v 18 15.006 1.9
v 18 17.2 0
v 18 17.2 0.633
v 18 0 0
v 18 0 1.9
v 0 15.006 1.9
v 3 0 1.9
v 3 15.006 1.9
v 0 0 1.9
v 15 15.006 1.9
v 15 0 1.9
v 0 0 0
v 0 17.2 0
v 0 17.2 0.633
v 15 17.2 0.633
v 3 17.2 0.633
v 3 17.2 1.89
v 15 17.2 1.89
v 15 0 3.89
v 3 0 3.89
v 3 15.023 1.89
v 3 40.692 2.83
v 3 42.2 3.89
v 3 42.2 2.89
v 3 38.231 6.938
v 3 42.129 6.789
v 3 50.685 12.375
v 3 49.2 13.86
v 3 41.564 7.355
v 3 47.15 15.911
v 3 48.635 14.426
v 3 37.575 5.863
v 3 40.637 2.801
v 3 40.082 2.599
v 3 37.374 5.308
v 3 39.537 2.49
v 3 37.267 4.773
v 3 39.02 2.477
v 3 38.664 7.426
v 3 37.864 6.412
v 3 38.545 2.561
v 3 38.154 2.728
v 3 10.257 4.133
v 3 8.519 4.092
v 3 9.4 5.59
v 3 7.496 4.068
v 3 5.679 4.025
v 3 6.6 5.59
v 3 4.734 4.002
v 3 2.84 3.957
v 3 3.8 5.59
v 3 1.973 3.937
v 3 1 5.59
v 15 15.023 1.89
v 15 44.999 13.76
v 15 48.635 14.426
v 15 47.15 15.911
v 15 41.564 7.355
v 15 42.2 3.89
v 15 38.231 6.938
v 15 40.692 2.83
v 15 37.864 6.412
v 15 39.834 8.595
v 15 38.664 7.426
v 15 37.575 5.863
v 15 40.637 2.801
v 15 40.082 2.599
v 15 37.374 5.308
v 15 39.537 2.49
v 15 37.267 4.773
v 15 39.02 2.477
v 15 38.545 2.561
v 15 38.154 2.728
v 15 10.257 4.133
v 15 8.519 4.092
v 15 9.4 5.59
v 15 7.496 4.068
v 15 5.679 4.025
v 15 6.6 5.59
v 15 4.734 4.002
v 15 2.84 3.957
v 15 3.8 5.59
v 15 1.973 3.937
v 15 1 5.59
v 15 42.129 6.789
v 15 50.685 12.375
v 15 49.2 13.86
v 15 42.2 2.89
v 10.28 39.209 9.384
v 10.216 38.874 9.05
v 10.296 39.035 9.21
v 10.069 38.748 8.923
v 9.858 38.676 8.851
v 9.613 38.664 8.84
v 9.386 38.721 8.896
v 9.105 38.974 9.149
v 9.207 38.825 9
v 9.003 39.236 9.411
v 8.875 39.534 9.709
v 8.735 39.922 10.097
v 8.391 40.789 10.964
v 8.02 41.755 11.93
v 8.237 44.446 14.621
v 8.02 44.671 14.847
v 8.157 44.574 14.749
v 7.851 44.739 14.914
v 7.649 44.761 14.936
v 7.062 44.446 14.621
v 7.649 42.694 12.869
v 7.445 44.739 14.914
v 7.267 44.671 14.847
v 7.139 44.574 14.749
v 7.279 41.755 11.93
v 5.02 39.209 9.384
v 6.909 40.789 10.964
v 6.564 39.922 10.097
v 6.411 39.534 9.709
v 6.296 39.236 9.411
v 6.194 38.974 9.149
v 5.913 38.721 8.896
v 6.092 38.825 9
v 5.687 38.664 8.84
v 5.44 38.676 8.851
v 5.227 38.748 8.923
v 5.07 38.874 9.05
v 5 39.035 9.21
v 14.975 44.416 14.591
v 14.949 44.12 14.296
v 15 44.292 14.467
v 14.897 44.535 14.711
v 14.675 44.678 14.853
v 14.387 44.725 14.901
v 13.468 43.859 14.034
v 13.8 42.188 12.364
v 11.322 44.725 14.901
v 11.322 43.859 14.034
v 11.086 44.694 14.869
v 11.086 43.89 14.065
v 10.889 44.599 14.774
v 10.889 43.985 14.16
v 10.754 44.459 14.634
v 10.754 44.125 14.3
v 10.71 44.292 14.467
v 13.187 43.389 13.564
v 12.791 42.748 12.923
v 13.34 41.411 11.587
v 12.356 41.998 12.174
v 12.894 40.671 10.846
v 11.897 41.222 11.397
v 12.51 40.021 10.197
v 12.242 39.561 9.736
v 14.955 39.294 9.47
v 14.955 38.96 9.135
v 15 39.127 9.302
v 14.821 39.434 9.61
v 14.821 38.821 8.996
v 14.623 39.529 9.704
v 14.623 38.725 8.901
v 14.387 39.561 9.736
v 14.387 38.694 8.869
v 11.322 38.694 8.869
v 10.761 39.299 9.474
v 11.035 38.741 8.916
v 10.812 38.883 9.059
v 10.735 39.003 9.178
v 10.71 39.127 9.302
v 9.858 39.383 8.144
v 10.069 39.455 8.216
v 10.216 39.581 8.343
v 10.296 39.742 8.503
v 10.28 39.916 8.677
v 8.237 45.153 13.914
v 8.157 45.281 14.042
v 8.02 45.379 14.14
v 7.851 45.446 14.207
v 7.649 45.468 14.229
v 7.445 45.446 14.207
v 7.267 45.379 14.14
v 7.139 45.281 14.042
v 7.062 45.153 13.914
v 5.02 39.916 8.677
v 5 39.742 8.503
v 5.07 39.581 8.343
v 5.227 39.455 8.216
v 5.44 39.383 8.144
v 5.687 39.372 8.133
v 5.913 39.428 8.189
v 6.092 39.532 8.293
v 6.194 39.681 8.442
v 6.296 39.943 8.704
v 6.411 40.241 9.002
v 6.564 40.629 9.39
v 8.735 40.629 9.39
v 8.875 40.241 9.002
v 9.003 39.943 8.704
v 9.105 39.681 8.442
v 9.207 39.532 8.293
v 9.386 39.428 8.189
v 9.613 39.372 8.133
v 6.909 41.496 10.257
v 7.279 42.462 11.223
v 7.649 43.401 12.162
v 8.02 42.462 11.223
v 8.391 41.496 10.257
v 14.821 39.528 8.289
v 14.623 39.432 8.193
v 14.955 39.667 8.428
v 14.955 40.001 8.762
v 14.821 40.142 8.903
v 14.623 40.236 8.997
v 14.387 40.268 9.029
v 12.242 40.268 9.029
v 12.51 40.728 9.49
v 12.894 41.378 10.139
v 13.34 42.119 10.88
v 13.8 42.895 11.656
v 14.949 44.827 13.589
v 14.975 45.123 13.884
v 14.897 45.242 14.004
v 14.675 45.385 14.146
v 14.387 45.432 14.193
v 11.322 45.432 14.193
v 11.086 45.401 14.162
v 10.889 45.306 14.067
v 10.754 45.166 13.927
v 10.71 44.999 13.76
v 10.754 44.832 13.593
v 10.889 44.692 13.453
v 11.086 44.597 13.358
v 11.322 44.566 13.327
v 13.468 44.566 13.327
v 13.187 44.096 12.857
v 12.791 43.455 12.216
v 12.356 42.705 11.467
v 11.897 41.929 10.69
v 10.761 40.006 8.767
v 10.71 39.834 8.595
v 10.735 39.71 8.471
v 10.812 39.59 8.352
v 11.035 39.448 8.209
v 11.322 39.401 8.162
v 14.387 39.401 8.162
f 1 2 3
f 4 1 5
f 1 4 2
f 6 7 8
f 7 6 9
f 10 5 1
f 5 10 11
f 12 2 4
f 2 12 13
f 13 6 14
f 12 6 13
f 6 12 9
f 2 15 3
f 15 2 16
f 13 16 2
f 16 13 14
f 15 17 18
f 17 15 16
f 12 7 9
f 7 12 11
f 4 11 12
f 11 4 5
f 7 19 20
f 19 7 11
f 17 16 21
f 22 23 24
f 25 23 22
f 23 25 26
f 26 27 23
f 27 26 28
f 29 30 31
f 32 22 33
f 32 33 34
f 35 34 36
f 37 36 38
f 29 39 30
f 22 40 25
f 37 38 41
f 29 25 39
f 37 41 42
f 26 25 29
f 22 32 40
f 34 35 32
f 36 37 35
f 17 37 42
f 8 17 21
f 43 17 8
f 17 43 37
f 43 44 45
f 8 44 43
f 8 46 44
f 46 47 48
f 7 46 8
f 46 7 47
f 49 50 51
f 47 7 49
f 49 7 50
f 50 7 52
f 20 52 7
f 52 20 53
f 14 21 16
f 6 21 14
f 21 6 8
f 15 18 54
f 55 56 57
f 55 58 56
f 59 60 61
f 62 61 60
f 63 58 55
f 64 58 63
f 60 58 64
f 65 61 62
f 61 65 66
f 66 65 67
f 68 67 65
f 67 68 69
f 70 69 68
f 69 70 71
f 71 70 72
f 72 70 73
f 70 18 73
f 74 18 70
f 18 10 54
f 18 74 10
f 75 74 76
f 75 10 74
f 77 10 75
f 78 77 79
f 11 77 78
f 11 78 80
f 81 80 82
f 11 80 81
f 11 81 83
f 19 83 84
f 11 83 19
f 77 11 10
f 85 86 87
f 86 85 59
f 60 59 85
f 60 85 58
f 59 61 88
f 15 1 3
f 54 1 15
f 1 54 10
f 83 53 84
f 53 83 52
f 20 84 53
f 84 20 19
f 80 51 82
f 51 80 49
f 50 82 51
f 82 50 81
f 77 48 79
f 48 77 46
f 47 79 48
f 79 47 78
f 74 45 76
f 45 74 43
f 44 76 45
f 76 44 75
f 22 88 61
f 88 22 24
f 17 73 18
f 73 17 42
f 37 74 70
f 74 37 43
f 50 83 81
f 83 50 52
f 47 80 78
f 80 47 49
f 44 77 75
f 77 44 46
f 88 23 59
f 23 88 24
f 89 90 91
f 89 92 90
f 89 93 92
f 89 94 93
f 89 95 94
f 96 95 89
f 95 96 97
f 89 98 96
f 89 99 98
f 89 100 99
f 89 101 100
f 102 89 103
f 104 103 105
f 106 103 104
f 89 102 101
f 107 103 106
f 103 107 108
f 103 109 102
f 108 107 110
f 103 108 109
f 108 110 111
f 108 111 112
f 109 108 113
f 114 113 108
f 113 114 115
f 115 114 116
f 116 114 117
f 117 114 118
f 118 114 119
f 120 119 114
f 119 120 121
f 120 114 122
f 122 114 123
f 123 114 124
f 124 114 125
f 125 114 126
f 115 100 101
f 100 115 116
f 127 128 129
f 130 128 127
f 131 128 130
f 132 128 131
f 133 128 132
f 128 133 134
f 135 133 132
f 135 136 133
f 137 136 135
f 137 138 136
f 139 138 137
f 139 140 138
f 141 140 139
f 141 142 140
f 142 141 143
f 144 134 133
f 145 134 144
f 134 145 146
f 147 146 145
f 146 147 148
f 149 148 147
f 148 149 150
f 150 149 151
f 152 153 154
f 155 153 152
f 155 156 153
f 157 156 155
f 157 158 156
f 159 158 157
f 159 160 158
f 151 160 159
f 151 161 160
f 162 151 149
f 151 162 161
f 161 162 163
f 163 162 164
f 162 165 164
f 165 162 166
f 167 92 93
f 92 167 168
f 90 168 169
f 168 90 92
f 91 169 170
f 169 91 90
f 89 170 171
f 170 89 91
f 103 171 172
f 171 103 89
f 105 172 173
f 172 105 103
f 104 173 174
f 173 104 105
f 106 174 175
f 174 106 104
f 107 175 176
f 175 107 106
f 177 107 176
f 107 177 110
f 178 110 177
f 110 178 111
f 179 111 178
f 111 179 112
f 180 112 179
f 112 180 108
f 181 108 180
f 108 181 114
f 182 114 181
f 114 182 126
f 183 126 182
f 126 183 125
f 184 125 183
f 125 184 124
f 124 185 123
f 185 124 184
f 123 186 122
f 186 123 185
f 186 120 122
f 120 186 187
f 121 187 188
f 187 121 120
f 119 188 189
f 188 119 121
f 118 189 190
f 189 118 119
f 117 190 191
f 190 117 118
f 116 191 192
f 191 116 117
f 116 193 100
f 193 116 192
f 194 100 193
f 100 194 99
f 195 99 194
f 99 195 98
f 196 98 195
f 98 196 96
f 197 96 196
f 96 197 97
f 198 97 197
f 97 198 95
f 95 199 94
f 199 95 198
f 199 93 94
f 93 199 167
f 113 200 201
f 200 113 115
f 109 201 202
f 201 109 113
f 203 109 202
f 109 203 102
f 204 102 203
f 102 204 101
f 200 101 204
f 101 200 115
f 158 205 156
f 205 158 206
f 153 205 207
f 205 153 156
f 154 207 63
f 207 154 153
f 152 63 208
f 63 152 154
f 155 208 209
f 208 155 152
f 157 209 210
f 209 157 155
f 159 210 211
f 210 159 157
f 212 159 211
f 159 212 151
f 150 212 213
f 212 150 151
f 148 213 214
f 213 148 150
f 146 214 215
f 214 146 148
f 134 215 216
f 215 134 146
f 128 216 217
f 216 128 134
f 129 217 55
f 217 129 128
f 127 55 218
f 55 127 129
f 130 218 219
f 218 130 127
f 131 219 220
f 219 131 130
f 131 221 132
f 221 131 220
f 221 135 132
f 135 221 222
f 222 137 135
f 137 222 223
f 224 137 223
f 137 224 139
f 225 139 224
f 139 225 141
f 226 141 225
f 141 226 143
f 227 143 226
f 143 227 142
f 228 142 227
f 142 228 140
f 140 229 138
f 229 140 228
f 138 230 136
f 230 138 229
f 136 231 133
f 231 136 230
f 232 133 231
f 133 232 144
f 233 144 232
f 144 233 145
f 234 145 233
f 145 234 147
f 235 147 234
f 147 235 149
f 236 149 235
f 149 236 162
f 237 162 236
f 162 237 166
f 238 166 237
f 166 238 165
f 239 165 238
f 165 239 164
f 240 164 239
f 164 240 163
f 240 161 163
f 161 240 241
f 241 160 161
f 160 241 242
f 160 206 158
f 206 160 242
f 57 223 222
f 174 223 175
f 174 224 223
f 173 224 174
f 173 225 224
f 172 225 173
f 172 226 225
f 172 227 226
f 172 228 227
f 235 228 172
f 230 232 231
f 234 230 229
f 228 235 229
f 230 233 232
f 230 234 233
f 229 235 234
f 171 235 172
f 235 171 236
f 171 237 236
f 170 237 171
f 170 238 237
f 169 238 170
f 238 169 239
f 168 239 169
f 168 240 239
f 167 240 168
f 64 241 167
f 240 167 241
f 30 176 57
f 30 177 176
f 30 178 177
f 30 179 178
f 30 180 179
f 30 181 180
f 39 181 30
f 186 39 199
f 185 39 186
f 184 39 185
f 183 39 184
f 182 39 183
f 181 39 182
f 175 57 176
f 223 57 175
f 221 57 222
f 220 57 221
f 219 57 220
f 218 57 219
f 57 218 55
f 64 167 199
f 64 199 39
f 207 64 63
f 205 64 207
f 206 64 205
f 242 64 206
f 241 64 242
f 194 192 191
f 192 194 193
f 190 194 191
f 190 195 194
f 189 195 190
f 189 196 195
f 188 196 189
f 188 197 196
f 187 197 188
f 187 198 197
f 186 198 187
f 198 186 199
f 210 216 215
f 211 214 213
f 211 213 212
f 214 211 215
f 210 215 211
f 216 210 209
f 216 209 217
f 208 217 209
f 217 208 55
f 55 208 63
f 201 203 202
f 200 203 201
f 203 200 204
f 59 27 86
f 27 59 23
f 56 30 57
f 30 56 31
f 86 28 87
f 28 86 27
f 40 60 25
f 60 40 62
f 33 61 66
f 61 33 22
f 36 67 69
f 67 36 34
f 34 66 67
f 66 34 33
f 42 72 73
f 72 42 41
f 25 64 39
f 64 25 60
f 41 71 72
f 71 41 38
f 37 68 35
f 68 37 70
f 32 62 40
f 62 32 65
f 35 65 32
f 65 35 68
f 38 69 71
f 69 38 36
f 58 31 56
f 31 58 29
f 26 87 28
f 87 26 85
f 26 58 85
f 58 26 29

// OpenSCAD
// file: hotshoe_paper_clip.scad
hs_w      = 18.0;
hs_l      = 17.2;
hs_h      = 1.9; // 2
hs2_w     = 12;
//hs2_l     = hs_l+5;
hs2_h     = 2;
hs2_x_off = (hs_w-hs2_w)/2;
hs2_elev  = 1;
hs3_l     = 12;
hs3_h     = 5;
hs3_w     = 0.8;

module hotshoe(
    logofile="", logooffset=1,
    len=5
    ) {
    hs2_l = hs_l+len;
    union() {
        // lower hotshoe
        difference() {
            cube([hs_w, hs_l, hs_h]);
            translate([-1,hs_l,hs_h/3]) rotate([60,0,0]) cube([hs2_x_off+1, 10,10]);
            translate([hs2_x_off+hs2_w,hs_l,hs_h/3]) rotate([60,0,0]) cube([hs2_x_off+1, 10,10]);
        }
        // upper plate including grip
        translate([hs2_x_off, 0, hs_h-0.01]) {
            rotate([90,0,90])
            linear_extrude(height=hs2_w) {
                polygon(
                points=[[0,0], [hs2_l,0], [hs_l,0], [hs2_l,hs2_elev],[hs2_l,hs2_elev+hs2_h],
                //[hs_l,hs2_h],
                [0,hs2_h]],
                paths=[[0,1,2,3,4,5,6]]
                );
            }
            for ( i = [0:3]) {
                translate([hs2_w/2,1+2.8*(i),hs2_h]) scale([1,1,1.7]) rotate([45,0,0]) cube([hs2_w,sqrt(2), sqrt(2)], center=true);
            }
        }
        translate([hs2_x_off, hs2_l, hs_h+hs2_elev+hs2_h/2-0.01])
        rotate([45,0,0])
        difference() {
            union() {
                // Logo
                translate([logooffset,1,hs3_h-1]) linear_extrude(height=1+1) import(file=logofile);
                // clasp
                cube([hs2_w, hs3_l, hs3_h]);
                translate([0,0,hs3_h/2]) scale([1,1.5,1]) rotate([0,90,0]) cylinder(h=hs2_w, r=hs3_h/2, $fn=36);
            }
            translate([-1,2,(hs3_h-hs3_w)/2]) cube([hs2_w+2, hs3_l, hs3_w]);
        }
    }
}
// main file
include <hotshoe_paper_clip.scad>

hotshoe(logofile="AZ.dxf", logooffset=2,len=25);
